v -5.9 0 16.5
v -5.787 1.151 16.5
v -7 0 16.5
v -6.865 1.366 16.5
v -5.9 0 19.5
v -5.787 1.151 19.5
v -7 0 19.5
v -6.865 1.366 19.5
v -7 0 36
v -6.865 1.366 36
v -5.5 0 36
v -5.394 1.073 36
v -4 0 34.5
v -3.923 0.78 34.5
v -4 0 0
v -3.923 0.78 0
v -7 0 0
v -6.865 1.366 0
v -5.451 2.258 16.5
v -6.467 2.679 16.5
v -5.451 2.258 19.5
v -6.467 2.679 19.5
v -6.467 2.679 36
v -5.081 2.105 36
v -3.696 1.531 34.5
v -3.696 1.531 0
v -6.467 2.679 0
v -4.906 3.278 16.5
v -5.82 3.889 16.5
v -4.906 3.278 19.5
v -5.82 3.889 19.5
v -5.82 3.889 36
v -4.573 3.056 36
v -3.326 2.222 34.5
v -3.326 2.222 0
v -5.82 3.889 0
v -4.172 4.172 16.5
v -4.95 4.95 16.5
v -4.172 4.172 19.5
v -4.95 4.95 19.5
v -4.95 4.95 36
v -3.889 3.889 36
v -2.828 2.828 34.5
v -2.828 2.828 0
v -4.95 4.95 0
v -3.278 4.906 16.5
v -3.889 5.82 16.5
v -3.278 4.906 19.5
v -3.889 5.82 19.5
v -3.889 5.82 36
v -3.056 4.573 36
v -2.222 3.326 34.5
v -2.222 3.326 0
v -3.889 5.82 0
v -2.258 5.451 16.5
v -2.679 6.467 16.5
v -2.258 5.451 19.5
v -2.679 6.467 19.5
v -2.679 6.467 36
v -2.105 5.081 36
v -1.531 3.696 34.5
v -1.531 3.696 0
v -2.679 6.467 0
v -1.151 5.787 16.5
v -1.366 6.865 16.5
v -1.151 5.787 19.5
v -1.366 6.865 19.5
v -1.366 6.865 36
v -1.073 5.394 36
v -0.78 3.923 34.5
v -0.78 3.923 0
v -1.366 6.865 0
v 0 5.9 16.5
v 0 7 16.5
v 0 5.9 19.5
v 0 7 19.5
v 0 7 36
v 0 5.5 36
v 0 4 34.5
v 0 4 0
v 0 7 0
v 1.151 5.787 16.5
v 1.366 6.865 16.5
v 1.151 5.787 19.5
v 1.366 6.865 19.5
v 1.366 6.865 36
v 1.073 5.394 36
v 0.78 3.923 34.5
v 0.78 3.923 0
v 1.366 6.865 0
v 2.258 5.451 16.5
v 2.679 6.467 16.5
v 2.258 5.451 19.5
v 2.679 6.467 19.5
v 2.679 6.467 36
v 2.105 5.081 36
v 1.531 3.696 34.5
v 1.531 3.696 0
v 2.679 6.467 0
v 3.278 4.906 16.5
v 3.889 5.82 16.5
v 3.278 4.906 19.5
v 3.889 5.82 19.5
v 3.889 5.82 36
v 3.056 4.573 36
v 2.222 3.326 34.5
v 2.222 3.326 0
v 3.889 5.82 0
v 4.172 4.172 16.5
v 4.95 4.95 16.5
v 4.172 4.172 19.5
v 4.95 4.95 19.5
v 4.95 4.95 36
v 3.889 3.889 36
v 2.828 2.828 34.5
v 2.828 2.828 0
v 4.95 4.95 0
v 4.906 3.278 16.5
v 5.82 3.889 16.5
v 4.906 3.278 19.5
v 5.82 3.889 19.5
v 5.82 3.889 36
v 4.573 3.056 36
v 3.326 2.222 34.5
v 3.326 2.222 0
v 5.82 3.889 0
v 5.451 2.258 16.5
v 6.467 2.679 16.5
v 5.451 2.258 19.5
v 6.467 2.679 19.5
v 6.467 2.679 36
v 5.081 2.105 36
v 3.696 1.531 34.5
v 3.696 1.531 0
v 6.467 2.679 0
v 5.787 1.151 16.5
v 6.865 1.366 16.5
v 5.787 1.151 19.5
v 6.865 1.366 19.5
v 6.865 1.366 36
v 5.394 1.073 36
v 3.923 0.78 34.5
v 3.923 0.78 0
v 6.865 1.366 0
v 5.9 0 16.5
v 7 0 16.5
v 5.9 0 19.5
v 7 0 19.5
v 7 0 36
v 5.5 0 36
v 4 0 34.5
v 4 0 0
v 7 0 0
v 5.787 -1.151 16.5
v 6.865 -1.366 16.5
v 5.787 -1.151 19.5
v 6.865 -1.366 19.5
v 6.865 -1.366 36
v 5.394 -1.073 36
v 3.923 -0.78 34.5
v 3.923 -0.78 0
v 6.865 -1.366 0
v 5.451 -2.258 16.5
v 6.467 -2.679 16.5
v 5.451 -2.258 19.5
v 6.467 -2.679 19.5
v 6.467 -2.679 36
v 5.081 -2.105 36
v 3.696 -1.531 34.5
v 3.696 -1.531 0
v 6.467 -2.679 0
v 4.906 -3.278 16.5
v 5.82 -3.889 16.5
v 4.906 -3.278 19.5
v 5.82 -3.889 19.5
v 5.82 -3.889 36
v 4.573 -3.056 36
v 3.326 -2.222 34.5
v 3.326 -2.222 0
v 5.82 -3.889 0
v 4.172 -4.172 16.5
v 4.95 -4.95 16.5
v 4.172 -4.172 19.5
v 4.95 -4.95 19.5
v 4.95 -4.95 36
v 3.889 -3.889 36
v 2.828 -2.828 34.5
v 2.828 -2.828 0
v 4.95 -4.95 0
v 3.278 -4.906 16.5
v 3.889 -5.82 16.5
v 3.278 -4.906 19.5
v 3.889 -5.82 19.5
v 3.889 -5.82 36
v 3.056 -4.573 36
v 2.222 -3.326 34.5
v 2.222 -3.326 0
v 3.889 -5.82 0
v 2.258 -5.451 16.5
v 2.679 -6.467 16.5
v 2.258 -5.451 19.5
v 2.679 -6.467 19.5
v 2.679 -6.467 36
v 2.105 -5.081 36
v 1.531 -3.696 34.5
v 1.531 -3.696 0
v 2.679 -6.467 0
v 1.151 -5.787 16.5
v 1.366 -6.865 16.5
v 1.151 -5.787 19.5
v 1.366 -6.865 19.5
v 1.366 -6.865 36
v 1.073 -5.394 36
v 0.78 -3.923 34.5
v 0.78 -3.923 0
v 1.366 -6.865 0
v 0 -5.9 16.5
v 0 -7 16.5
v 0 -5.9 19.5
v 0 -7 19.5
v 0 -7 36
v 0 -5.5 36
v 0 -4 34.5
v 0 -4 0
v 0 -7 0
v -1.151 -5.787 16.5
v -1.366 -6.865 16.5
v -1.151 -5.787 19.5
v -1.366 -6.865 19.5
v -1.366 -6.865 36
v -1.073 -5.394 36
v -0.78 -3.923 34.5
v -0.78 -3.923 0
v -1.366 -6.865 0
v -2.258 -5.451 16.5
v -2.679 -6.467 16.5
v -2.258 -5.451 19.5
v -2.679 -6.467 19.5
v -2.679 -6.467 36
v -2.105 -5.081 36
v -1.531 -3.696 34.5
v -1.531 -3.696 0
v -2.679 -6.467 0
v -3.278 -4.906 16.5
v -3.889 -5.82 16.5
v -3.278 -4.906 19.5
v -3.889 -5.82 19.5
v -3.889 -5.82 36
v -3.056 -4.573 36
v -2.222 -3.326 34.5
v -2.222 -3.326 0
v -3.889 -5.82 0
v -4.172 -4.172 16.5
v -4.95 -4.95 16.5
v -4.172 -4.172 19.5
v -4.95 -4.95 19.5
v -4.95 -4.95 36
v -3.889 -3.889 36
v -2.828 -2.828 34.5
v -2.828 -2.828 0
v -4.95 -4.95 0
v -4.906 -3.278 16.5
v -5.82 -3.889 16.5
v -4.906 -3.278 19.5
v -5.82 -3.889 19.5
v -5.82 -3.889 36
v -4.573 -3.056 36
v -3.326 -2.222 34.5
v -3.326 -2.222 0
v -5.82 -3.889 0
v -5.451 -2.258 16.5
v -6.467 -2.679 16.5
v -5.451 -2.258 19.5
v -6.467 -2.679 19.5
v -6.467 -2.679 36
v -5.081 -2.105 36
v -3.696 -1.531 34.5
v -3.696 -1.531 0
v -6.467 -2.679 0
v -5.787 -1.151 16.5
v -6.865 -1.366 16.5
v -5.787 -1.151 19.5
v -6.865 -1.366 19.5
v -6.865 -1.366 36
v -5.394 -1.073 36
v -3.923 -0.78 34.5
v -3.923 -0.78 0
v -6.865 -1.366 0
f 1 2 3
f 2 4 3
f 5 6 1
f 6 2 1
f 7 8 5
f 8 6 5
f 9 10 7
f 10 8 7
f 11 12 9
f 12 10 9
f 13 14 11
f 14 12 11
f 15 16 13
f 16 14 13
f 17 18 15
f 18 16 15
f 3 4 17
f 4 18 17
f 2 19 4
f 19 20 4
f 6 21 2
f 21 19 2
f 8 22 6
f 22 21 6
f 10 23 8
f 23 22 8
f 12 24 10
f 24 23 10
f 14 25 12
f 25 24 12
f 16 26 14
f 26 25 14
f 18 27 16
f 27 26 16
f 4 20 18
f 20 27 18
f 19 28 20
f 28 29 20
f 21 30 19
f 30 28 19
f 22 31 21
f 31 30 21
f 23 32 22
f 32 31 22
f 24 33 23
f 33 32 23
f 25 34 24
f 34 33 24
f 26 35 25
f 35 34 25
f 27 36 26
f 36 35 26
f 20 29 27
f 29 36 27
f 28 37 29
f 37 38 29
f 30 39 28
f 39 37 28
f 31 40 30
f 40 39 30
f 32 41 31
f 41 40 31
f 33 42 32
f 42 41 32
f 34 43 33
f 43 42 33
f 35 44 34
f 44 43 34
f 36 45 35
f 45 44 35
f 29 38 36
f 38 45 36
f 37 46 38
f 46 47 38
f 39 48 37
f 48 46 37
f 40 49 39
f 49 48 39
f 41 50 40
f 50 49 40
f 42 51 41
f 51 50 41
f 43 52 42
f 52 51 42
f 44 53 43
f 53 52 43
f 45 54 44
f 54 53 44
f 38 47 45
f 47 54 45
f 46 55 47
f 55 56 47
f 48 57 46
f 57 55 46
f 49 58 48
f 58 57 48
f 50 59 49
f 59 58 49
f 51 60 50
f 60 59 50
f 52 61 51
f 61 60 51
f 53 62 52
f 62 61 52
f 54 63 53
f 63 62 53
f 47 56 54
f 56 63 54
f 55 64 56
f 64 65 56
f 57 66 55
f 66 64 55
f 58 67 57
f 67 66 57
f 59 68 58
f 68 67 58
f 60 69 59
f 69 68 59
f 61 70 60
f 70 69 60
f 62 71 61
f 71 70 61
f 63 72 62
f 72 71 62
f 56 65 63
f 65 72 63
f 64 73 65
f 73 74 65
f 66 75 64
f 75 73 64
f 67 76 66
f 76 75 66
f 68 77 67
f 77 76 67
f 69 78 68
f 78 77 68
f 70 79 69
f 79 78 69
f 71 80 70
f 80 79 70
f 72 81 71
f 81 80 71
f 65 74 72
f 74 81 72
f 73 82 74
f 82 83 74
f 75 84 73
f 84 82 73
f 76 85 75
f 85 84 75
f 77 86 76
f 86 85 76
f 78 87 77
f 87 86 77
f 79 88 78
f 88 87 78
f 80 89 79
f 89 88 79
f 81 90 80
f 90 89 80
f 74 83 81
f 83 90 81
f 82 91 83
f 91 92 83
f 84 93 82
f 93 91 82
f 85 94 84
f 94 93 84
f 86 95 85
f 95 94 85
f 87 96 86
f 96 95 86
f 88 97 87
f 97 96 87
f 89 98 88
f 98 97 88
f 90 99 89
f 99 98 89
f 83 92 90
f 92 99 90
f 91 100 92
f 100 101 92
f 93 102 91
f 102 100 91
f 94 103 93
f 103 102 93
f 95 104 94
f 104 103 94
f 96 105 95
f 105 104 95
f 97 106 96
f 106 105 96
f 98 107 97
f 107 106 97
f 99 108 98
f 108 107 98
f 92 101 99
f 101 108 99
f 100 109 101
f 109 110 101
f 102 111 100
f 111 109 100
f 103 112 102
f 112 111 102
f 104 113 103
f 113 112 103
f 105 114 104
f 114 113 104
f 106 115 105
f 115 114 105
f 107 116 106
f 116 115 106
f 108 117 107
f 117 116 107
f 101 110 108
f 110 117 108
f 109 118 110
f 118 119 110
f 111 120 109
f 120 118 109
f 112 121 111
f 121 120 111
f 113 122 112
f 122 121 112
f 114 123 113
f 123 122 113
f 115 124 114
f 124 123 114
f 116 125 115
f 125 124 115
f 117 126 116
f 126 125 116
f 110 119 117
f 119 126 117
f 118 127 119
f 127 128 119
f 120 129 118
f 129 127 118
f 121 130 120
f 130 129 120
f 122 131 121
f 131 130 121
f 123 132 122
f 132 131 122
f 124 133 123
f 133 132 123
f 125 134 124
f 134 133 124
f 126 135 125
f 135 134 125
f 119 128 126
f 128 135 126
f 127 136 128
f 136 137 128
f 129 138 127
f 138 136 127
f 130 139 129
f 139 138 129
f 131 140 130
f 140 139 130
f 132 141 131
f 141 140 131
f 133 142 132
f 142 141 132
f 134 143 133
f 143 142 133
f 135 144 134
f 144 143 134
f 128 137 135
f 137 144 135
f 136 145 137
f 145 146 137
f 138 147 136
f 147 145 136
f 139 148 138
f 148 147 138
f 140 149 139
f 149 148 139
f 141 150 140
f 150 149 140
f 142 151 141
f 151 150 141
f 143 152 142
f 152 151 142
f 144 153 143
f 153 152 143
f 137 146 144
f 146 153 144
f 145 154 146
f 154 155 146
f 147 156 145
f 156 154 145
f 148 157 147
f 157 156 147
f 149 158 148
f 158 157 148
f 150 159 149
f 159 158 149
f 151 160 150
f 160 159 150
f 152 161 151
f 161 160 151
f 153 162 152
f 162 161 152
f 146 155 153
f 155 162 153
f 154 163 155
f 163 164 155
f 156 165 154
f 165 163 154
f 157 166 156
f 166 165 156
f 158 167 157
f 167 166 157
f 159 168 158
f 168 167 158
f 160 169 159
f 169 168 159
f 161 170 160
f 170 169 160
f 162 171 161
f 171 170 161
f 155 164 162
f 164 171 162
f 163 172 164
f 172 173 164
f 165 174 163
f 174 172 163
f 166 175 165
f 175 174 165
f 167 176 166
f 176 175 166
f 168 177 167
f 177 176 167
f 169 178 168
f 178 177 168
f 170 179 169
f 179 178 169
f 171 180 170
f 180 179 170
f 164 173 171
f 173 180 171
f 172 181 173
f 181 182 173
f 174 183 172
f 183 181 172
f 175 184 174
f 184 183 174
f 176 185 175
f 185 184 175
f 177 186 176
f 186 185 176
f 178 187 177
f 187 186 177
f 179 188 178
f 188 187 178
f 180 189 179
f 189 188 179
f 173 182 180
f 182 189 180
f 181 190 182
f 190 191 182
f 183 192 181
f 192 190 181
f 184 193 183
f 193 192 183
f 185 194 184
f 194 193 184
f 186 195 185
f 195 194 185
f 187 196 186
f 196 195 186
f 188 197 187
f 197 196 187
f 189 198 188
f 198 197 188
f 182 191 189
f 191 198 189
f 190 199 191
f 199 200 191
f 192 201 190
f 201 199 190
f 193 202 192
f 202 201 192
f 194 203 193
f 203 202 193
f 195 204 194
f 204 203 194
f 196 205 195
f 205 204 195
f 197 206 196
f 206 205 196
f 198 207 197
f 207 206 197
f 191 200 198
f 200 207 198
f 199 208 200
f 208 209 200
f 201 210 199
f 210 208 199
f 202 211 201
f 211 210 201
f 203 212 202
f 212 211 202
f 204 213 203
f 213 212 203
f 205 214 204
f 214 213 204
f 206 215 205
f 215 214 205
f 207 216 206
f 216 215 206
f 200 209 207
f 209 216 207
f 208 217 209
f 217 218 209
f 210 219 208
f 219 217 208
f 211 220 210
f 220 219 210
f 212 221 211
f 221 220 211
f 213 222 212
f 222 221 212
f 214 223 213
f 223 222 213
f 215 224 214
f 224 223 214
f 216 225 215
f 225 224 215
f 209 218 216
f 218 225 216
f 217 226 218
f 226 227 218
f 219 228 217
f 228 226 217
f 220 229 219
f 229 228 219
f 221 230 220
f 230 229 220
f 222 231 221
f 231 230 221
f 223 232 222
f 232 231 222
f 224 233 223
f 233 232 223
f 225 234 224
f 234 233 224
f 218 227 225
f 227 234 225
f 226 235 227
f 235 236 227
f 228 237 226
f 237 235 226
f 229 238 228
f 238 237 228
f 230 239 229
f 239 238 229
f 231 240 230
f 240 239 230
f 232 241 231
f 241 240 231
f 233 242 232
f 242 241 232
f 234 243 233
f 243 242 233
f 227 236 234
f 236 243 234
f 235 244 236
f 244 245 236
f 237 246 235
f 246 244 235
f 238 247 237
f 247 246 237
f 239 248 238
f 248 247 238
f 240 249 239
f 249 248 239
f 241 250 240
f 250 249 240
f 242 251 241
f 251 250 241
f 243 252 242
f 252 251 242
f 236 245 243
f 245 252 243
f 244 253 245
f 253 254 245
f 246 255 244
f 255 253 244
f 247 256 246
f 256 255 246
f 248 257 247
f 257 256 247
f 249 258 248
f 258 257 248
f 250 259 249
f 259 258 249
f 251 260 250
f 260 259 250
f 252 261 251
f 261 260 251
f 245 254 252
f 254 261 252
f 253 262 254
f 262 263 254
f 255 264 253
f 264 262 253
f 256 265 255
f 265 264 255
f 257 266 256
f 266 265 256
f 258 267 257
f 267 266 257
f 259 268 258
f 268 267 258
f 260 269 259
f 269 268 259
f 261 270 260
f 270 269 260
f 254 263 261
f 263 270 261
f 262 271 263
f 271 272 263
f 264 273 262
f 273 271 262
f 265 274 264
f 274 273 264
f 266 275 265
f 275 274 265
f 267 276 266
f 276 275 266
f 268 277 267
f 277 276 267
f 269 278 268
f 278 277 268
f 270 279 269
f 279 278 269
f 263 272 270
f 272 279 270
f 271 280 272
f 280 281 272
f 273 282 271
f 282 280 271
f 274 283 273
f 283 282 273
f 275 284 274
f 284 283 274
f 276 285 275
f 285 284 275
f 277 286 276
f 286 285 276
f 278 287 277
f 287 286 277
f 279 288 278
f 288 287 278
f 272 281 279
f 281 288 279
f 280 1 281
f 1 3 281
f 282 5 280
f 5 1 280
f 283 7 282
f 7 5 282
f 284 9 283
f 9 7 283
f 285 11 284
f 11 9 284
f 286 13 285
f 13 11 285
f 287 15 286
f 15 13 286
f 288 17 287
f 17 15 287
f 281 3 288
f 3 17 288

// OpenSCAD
$fn = 32;

// ----------------------------------------------------------------------
// Grooved revolve: thread_relief, bore R4
// ----------------------------------------------------------------------

// --- parameters (mm) ---
bore_r = 4;               // bore radius
outer_r = 7;              // outer radius of the body
total_h = 36;             // overall height, Z
wall = 3;                 // radial wall thickness
groove_w = 3;             // groove width
groove_d = 1.1;           // groove depth
grooves = 1;              // number of outer grooves
relief = 1.5;             // thread relief leg at the bore mouth
relief_angle = 45;        // thread relief chamfer angle, degrees

bbox_x = 2 * outer_r;  // full diameter
bore_d = 2 * bore_r;  // bore diameter
body_d = 2 * outer_r;  // body diameter
revolve_angle = 360;  // full turn around the Z axis

profile = [[4, 0], [7, 0], [7, 16.5], [5.9, 16.5], [5.9, 19.5], [7, 19.5], [7, 36], [5.5, 36], [4, 34.5]];  // primary outline, 9 points, counter clockwise

// --- the one profile operation ---
rotate_extrude(angle = revolve_angle) polygon(points = profile);
